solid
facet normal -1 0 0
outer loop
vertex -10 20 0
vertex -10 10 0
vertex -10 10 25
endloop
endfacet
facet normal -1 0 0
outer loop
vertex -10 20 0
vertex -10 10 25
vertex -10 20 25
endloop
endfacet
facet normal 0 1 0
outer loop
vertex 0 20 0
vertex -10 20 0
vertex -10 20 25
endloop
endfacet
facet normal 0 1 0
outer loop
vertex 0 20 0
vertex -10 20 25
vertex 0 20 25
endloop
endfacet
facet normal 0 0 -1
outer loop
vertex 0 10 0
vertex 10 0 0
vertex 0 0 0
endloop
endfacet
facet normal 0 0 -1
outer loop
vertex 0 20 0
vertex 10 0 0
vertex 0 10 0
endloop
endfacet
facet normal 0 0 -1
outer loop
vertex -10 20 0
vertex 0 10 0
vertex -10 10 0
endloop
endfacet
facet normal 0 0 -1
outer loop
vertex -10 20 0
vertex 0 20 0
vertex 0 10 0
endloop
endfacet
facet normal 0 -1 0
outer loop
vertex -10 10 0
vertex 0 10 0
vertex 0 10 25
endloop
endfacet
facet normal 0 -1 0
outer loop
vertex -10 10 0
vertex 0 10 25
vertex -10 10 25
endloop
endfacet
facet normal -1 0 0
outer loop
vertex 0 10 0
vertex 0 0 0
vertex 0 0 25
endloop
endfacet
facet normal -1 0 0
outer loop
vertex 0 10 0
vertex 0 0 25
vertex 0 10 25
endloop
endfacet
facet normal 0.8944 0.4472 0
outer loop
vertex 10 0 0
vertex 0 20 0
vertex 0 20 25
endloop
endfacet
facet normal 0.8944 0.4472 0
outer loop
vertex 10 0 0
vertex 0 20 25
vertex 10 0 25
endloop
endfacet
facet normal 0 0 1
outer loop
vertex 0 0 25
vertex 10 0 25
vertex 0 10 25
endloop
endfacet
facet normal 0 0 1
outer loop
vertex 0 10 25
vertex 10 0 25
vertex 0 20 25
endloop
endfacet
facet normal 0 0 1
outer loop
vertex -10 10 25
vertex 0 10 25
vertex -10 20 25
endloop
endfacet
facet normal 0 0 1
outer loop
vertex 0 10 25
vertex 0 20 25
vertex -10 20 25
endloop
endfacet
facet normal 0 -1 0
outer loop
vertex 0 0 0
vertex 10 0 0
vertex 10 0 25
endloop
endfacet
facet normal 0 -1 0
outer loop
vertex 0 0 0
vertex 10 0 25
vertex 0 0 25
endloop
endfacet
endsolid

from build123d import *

# Parameters (mm, degrees)
BOSS_EXTRUDE1_DEPTH = 25


with BuildPart() as part:
    # Sketch1 → Boss-Extrude1 (new body)
    with BuildSketch(Plane.XY):
        Polygon((-10, 20), (0, 20), (10, 0), (0, 0), (0, 10), (-10, 10), align=None)
    extrude(amount=BOSS_EXTRUDE1_DEPTH)


solid = part.part
